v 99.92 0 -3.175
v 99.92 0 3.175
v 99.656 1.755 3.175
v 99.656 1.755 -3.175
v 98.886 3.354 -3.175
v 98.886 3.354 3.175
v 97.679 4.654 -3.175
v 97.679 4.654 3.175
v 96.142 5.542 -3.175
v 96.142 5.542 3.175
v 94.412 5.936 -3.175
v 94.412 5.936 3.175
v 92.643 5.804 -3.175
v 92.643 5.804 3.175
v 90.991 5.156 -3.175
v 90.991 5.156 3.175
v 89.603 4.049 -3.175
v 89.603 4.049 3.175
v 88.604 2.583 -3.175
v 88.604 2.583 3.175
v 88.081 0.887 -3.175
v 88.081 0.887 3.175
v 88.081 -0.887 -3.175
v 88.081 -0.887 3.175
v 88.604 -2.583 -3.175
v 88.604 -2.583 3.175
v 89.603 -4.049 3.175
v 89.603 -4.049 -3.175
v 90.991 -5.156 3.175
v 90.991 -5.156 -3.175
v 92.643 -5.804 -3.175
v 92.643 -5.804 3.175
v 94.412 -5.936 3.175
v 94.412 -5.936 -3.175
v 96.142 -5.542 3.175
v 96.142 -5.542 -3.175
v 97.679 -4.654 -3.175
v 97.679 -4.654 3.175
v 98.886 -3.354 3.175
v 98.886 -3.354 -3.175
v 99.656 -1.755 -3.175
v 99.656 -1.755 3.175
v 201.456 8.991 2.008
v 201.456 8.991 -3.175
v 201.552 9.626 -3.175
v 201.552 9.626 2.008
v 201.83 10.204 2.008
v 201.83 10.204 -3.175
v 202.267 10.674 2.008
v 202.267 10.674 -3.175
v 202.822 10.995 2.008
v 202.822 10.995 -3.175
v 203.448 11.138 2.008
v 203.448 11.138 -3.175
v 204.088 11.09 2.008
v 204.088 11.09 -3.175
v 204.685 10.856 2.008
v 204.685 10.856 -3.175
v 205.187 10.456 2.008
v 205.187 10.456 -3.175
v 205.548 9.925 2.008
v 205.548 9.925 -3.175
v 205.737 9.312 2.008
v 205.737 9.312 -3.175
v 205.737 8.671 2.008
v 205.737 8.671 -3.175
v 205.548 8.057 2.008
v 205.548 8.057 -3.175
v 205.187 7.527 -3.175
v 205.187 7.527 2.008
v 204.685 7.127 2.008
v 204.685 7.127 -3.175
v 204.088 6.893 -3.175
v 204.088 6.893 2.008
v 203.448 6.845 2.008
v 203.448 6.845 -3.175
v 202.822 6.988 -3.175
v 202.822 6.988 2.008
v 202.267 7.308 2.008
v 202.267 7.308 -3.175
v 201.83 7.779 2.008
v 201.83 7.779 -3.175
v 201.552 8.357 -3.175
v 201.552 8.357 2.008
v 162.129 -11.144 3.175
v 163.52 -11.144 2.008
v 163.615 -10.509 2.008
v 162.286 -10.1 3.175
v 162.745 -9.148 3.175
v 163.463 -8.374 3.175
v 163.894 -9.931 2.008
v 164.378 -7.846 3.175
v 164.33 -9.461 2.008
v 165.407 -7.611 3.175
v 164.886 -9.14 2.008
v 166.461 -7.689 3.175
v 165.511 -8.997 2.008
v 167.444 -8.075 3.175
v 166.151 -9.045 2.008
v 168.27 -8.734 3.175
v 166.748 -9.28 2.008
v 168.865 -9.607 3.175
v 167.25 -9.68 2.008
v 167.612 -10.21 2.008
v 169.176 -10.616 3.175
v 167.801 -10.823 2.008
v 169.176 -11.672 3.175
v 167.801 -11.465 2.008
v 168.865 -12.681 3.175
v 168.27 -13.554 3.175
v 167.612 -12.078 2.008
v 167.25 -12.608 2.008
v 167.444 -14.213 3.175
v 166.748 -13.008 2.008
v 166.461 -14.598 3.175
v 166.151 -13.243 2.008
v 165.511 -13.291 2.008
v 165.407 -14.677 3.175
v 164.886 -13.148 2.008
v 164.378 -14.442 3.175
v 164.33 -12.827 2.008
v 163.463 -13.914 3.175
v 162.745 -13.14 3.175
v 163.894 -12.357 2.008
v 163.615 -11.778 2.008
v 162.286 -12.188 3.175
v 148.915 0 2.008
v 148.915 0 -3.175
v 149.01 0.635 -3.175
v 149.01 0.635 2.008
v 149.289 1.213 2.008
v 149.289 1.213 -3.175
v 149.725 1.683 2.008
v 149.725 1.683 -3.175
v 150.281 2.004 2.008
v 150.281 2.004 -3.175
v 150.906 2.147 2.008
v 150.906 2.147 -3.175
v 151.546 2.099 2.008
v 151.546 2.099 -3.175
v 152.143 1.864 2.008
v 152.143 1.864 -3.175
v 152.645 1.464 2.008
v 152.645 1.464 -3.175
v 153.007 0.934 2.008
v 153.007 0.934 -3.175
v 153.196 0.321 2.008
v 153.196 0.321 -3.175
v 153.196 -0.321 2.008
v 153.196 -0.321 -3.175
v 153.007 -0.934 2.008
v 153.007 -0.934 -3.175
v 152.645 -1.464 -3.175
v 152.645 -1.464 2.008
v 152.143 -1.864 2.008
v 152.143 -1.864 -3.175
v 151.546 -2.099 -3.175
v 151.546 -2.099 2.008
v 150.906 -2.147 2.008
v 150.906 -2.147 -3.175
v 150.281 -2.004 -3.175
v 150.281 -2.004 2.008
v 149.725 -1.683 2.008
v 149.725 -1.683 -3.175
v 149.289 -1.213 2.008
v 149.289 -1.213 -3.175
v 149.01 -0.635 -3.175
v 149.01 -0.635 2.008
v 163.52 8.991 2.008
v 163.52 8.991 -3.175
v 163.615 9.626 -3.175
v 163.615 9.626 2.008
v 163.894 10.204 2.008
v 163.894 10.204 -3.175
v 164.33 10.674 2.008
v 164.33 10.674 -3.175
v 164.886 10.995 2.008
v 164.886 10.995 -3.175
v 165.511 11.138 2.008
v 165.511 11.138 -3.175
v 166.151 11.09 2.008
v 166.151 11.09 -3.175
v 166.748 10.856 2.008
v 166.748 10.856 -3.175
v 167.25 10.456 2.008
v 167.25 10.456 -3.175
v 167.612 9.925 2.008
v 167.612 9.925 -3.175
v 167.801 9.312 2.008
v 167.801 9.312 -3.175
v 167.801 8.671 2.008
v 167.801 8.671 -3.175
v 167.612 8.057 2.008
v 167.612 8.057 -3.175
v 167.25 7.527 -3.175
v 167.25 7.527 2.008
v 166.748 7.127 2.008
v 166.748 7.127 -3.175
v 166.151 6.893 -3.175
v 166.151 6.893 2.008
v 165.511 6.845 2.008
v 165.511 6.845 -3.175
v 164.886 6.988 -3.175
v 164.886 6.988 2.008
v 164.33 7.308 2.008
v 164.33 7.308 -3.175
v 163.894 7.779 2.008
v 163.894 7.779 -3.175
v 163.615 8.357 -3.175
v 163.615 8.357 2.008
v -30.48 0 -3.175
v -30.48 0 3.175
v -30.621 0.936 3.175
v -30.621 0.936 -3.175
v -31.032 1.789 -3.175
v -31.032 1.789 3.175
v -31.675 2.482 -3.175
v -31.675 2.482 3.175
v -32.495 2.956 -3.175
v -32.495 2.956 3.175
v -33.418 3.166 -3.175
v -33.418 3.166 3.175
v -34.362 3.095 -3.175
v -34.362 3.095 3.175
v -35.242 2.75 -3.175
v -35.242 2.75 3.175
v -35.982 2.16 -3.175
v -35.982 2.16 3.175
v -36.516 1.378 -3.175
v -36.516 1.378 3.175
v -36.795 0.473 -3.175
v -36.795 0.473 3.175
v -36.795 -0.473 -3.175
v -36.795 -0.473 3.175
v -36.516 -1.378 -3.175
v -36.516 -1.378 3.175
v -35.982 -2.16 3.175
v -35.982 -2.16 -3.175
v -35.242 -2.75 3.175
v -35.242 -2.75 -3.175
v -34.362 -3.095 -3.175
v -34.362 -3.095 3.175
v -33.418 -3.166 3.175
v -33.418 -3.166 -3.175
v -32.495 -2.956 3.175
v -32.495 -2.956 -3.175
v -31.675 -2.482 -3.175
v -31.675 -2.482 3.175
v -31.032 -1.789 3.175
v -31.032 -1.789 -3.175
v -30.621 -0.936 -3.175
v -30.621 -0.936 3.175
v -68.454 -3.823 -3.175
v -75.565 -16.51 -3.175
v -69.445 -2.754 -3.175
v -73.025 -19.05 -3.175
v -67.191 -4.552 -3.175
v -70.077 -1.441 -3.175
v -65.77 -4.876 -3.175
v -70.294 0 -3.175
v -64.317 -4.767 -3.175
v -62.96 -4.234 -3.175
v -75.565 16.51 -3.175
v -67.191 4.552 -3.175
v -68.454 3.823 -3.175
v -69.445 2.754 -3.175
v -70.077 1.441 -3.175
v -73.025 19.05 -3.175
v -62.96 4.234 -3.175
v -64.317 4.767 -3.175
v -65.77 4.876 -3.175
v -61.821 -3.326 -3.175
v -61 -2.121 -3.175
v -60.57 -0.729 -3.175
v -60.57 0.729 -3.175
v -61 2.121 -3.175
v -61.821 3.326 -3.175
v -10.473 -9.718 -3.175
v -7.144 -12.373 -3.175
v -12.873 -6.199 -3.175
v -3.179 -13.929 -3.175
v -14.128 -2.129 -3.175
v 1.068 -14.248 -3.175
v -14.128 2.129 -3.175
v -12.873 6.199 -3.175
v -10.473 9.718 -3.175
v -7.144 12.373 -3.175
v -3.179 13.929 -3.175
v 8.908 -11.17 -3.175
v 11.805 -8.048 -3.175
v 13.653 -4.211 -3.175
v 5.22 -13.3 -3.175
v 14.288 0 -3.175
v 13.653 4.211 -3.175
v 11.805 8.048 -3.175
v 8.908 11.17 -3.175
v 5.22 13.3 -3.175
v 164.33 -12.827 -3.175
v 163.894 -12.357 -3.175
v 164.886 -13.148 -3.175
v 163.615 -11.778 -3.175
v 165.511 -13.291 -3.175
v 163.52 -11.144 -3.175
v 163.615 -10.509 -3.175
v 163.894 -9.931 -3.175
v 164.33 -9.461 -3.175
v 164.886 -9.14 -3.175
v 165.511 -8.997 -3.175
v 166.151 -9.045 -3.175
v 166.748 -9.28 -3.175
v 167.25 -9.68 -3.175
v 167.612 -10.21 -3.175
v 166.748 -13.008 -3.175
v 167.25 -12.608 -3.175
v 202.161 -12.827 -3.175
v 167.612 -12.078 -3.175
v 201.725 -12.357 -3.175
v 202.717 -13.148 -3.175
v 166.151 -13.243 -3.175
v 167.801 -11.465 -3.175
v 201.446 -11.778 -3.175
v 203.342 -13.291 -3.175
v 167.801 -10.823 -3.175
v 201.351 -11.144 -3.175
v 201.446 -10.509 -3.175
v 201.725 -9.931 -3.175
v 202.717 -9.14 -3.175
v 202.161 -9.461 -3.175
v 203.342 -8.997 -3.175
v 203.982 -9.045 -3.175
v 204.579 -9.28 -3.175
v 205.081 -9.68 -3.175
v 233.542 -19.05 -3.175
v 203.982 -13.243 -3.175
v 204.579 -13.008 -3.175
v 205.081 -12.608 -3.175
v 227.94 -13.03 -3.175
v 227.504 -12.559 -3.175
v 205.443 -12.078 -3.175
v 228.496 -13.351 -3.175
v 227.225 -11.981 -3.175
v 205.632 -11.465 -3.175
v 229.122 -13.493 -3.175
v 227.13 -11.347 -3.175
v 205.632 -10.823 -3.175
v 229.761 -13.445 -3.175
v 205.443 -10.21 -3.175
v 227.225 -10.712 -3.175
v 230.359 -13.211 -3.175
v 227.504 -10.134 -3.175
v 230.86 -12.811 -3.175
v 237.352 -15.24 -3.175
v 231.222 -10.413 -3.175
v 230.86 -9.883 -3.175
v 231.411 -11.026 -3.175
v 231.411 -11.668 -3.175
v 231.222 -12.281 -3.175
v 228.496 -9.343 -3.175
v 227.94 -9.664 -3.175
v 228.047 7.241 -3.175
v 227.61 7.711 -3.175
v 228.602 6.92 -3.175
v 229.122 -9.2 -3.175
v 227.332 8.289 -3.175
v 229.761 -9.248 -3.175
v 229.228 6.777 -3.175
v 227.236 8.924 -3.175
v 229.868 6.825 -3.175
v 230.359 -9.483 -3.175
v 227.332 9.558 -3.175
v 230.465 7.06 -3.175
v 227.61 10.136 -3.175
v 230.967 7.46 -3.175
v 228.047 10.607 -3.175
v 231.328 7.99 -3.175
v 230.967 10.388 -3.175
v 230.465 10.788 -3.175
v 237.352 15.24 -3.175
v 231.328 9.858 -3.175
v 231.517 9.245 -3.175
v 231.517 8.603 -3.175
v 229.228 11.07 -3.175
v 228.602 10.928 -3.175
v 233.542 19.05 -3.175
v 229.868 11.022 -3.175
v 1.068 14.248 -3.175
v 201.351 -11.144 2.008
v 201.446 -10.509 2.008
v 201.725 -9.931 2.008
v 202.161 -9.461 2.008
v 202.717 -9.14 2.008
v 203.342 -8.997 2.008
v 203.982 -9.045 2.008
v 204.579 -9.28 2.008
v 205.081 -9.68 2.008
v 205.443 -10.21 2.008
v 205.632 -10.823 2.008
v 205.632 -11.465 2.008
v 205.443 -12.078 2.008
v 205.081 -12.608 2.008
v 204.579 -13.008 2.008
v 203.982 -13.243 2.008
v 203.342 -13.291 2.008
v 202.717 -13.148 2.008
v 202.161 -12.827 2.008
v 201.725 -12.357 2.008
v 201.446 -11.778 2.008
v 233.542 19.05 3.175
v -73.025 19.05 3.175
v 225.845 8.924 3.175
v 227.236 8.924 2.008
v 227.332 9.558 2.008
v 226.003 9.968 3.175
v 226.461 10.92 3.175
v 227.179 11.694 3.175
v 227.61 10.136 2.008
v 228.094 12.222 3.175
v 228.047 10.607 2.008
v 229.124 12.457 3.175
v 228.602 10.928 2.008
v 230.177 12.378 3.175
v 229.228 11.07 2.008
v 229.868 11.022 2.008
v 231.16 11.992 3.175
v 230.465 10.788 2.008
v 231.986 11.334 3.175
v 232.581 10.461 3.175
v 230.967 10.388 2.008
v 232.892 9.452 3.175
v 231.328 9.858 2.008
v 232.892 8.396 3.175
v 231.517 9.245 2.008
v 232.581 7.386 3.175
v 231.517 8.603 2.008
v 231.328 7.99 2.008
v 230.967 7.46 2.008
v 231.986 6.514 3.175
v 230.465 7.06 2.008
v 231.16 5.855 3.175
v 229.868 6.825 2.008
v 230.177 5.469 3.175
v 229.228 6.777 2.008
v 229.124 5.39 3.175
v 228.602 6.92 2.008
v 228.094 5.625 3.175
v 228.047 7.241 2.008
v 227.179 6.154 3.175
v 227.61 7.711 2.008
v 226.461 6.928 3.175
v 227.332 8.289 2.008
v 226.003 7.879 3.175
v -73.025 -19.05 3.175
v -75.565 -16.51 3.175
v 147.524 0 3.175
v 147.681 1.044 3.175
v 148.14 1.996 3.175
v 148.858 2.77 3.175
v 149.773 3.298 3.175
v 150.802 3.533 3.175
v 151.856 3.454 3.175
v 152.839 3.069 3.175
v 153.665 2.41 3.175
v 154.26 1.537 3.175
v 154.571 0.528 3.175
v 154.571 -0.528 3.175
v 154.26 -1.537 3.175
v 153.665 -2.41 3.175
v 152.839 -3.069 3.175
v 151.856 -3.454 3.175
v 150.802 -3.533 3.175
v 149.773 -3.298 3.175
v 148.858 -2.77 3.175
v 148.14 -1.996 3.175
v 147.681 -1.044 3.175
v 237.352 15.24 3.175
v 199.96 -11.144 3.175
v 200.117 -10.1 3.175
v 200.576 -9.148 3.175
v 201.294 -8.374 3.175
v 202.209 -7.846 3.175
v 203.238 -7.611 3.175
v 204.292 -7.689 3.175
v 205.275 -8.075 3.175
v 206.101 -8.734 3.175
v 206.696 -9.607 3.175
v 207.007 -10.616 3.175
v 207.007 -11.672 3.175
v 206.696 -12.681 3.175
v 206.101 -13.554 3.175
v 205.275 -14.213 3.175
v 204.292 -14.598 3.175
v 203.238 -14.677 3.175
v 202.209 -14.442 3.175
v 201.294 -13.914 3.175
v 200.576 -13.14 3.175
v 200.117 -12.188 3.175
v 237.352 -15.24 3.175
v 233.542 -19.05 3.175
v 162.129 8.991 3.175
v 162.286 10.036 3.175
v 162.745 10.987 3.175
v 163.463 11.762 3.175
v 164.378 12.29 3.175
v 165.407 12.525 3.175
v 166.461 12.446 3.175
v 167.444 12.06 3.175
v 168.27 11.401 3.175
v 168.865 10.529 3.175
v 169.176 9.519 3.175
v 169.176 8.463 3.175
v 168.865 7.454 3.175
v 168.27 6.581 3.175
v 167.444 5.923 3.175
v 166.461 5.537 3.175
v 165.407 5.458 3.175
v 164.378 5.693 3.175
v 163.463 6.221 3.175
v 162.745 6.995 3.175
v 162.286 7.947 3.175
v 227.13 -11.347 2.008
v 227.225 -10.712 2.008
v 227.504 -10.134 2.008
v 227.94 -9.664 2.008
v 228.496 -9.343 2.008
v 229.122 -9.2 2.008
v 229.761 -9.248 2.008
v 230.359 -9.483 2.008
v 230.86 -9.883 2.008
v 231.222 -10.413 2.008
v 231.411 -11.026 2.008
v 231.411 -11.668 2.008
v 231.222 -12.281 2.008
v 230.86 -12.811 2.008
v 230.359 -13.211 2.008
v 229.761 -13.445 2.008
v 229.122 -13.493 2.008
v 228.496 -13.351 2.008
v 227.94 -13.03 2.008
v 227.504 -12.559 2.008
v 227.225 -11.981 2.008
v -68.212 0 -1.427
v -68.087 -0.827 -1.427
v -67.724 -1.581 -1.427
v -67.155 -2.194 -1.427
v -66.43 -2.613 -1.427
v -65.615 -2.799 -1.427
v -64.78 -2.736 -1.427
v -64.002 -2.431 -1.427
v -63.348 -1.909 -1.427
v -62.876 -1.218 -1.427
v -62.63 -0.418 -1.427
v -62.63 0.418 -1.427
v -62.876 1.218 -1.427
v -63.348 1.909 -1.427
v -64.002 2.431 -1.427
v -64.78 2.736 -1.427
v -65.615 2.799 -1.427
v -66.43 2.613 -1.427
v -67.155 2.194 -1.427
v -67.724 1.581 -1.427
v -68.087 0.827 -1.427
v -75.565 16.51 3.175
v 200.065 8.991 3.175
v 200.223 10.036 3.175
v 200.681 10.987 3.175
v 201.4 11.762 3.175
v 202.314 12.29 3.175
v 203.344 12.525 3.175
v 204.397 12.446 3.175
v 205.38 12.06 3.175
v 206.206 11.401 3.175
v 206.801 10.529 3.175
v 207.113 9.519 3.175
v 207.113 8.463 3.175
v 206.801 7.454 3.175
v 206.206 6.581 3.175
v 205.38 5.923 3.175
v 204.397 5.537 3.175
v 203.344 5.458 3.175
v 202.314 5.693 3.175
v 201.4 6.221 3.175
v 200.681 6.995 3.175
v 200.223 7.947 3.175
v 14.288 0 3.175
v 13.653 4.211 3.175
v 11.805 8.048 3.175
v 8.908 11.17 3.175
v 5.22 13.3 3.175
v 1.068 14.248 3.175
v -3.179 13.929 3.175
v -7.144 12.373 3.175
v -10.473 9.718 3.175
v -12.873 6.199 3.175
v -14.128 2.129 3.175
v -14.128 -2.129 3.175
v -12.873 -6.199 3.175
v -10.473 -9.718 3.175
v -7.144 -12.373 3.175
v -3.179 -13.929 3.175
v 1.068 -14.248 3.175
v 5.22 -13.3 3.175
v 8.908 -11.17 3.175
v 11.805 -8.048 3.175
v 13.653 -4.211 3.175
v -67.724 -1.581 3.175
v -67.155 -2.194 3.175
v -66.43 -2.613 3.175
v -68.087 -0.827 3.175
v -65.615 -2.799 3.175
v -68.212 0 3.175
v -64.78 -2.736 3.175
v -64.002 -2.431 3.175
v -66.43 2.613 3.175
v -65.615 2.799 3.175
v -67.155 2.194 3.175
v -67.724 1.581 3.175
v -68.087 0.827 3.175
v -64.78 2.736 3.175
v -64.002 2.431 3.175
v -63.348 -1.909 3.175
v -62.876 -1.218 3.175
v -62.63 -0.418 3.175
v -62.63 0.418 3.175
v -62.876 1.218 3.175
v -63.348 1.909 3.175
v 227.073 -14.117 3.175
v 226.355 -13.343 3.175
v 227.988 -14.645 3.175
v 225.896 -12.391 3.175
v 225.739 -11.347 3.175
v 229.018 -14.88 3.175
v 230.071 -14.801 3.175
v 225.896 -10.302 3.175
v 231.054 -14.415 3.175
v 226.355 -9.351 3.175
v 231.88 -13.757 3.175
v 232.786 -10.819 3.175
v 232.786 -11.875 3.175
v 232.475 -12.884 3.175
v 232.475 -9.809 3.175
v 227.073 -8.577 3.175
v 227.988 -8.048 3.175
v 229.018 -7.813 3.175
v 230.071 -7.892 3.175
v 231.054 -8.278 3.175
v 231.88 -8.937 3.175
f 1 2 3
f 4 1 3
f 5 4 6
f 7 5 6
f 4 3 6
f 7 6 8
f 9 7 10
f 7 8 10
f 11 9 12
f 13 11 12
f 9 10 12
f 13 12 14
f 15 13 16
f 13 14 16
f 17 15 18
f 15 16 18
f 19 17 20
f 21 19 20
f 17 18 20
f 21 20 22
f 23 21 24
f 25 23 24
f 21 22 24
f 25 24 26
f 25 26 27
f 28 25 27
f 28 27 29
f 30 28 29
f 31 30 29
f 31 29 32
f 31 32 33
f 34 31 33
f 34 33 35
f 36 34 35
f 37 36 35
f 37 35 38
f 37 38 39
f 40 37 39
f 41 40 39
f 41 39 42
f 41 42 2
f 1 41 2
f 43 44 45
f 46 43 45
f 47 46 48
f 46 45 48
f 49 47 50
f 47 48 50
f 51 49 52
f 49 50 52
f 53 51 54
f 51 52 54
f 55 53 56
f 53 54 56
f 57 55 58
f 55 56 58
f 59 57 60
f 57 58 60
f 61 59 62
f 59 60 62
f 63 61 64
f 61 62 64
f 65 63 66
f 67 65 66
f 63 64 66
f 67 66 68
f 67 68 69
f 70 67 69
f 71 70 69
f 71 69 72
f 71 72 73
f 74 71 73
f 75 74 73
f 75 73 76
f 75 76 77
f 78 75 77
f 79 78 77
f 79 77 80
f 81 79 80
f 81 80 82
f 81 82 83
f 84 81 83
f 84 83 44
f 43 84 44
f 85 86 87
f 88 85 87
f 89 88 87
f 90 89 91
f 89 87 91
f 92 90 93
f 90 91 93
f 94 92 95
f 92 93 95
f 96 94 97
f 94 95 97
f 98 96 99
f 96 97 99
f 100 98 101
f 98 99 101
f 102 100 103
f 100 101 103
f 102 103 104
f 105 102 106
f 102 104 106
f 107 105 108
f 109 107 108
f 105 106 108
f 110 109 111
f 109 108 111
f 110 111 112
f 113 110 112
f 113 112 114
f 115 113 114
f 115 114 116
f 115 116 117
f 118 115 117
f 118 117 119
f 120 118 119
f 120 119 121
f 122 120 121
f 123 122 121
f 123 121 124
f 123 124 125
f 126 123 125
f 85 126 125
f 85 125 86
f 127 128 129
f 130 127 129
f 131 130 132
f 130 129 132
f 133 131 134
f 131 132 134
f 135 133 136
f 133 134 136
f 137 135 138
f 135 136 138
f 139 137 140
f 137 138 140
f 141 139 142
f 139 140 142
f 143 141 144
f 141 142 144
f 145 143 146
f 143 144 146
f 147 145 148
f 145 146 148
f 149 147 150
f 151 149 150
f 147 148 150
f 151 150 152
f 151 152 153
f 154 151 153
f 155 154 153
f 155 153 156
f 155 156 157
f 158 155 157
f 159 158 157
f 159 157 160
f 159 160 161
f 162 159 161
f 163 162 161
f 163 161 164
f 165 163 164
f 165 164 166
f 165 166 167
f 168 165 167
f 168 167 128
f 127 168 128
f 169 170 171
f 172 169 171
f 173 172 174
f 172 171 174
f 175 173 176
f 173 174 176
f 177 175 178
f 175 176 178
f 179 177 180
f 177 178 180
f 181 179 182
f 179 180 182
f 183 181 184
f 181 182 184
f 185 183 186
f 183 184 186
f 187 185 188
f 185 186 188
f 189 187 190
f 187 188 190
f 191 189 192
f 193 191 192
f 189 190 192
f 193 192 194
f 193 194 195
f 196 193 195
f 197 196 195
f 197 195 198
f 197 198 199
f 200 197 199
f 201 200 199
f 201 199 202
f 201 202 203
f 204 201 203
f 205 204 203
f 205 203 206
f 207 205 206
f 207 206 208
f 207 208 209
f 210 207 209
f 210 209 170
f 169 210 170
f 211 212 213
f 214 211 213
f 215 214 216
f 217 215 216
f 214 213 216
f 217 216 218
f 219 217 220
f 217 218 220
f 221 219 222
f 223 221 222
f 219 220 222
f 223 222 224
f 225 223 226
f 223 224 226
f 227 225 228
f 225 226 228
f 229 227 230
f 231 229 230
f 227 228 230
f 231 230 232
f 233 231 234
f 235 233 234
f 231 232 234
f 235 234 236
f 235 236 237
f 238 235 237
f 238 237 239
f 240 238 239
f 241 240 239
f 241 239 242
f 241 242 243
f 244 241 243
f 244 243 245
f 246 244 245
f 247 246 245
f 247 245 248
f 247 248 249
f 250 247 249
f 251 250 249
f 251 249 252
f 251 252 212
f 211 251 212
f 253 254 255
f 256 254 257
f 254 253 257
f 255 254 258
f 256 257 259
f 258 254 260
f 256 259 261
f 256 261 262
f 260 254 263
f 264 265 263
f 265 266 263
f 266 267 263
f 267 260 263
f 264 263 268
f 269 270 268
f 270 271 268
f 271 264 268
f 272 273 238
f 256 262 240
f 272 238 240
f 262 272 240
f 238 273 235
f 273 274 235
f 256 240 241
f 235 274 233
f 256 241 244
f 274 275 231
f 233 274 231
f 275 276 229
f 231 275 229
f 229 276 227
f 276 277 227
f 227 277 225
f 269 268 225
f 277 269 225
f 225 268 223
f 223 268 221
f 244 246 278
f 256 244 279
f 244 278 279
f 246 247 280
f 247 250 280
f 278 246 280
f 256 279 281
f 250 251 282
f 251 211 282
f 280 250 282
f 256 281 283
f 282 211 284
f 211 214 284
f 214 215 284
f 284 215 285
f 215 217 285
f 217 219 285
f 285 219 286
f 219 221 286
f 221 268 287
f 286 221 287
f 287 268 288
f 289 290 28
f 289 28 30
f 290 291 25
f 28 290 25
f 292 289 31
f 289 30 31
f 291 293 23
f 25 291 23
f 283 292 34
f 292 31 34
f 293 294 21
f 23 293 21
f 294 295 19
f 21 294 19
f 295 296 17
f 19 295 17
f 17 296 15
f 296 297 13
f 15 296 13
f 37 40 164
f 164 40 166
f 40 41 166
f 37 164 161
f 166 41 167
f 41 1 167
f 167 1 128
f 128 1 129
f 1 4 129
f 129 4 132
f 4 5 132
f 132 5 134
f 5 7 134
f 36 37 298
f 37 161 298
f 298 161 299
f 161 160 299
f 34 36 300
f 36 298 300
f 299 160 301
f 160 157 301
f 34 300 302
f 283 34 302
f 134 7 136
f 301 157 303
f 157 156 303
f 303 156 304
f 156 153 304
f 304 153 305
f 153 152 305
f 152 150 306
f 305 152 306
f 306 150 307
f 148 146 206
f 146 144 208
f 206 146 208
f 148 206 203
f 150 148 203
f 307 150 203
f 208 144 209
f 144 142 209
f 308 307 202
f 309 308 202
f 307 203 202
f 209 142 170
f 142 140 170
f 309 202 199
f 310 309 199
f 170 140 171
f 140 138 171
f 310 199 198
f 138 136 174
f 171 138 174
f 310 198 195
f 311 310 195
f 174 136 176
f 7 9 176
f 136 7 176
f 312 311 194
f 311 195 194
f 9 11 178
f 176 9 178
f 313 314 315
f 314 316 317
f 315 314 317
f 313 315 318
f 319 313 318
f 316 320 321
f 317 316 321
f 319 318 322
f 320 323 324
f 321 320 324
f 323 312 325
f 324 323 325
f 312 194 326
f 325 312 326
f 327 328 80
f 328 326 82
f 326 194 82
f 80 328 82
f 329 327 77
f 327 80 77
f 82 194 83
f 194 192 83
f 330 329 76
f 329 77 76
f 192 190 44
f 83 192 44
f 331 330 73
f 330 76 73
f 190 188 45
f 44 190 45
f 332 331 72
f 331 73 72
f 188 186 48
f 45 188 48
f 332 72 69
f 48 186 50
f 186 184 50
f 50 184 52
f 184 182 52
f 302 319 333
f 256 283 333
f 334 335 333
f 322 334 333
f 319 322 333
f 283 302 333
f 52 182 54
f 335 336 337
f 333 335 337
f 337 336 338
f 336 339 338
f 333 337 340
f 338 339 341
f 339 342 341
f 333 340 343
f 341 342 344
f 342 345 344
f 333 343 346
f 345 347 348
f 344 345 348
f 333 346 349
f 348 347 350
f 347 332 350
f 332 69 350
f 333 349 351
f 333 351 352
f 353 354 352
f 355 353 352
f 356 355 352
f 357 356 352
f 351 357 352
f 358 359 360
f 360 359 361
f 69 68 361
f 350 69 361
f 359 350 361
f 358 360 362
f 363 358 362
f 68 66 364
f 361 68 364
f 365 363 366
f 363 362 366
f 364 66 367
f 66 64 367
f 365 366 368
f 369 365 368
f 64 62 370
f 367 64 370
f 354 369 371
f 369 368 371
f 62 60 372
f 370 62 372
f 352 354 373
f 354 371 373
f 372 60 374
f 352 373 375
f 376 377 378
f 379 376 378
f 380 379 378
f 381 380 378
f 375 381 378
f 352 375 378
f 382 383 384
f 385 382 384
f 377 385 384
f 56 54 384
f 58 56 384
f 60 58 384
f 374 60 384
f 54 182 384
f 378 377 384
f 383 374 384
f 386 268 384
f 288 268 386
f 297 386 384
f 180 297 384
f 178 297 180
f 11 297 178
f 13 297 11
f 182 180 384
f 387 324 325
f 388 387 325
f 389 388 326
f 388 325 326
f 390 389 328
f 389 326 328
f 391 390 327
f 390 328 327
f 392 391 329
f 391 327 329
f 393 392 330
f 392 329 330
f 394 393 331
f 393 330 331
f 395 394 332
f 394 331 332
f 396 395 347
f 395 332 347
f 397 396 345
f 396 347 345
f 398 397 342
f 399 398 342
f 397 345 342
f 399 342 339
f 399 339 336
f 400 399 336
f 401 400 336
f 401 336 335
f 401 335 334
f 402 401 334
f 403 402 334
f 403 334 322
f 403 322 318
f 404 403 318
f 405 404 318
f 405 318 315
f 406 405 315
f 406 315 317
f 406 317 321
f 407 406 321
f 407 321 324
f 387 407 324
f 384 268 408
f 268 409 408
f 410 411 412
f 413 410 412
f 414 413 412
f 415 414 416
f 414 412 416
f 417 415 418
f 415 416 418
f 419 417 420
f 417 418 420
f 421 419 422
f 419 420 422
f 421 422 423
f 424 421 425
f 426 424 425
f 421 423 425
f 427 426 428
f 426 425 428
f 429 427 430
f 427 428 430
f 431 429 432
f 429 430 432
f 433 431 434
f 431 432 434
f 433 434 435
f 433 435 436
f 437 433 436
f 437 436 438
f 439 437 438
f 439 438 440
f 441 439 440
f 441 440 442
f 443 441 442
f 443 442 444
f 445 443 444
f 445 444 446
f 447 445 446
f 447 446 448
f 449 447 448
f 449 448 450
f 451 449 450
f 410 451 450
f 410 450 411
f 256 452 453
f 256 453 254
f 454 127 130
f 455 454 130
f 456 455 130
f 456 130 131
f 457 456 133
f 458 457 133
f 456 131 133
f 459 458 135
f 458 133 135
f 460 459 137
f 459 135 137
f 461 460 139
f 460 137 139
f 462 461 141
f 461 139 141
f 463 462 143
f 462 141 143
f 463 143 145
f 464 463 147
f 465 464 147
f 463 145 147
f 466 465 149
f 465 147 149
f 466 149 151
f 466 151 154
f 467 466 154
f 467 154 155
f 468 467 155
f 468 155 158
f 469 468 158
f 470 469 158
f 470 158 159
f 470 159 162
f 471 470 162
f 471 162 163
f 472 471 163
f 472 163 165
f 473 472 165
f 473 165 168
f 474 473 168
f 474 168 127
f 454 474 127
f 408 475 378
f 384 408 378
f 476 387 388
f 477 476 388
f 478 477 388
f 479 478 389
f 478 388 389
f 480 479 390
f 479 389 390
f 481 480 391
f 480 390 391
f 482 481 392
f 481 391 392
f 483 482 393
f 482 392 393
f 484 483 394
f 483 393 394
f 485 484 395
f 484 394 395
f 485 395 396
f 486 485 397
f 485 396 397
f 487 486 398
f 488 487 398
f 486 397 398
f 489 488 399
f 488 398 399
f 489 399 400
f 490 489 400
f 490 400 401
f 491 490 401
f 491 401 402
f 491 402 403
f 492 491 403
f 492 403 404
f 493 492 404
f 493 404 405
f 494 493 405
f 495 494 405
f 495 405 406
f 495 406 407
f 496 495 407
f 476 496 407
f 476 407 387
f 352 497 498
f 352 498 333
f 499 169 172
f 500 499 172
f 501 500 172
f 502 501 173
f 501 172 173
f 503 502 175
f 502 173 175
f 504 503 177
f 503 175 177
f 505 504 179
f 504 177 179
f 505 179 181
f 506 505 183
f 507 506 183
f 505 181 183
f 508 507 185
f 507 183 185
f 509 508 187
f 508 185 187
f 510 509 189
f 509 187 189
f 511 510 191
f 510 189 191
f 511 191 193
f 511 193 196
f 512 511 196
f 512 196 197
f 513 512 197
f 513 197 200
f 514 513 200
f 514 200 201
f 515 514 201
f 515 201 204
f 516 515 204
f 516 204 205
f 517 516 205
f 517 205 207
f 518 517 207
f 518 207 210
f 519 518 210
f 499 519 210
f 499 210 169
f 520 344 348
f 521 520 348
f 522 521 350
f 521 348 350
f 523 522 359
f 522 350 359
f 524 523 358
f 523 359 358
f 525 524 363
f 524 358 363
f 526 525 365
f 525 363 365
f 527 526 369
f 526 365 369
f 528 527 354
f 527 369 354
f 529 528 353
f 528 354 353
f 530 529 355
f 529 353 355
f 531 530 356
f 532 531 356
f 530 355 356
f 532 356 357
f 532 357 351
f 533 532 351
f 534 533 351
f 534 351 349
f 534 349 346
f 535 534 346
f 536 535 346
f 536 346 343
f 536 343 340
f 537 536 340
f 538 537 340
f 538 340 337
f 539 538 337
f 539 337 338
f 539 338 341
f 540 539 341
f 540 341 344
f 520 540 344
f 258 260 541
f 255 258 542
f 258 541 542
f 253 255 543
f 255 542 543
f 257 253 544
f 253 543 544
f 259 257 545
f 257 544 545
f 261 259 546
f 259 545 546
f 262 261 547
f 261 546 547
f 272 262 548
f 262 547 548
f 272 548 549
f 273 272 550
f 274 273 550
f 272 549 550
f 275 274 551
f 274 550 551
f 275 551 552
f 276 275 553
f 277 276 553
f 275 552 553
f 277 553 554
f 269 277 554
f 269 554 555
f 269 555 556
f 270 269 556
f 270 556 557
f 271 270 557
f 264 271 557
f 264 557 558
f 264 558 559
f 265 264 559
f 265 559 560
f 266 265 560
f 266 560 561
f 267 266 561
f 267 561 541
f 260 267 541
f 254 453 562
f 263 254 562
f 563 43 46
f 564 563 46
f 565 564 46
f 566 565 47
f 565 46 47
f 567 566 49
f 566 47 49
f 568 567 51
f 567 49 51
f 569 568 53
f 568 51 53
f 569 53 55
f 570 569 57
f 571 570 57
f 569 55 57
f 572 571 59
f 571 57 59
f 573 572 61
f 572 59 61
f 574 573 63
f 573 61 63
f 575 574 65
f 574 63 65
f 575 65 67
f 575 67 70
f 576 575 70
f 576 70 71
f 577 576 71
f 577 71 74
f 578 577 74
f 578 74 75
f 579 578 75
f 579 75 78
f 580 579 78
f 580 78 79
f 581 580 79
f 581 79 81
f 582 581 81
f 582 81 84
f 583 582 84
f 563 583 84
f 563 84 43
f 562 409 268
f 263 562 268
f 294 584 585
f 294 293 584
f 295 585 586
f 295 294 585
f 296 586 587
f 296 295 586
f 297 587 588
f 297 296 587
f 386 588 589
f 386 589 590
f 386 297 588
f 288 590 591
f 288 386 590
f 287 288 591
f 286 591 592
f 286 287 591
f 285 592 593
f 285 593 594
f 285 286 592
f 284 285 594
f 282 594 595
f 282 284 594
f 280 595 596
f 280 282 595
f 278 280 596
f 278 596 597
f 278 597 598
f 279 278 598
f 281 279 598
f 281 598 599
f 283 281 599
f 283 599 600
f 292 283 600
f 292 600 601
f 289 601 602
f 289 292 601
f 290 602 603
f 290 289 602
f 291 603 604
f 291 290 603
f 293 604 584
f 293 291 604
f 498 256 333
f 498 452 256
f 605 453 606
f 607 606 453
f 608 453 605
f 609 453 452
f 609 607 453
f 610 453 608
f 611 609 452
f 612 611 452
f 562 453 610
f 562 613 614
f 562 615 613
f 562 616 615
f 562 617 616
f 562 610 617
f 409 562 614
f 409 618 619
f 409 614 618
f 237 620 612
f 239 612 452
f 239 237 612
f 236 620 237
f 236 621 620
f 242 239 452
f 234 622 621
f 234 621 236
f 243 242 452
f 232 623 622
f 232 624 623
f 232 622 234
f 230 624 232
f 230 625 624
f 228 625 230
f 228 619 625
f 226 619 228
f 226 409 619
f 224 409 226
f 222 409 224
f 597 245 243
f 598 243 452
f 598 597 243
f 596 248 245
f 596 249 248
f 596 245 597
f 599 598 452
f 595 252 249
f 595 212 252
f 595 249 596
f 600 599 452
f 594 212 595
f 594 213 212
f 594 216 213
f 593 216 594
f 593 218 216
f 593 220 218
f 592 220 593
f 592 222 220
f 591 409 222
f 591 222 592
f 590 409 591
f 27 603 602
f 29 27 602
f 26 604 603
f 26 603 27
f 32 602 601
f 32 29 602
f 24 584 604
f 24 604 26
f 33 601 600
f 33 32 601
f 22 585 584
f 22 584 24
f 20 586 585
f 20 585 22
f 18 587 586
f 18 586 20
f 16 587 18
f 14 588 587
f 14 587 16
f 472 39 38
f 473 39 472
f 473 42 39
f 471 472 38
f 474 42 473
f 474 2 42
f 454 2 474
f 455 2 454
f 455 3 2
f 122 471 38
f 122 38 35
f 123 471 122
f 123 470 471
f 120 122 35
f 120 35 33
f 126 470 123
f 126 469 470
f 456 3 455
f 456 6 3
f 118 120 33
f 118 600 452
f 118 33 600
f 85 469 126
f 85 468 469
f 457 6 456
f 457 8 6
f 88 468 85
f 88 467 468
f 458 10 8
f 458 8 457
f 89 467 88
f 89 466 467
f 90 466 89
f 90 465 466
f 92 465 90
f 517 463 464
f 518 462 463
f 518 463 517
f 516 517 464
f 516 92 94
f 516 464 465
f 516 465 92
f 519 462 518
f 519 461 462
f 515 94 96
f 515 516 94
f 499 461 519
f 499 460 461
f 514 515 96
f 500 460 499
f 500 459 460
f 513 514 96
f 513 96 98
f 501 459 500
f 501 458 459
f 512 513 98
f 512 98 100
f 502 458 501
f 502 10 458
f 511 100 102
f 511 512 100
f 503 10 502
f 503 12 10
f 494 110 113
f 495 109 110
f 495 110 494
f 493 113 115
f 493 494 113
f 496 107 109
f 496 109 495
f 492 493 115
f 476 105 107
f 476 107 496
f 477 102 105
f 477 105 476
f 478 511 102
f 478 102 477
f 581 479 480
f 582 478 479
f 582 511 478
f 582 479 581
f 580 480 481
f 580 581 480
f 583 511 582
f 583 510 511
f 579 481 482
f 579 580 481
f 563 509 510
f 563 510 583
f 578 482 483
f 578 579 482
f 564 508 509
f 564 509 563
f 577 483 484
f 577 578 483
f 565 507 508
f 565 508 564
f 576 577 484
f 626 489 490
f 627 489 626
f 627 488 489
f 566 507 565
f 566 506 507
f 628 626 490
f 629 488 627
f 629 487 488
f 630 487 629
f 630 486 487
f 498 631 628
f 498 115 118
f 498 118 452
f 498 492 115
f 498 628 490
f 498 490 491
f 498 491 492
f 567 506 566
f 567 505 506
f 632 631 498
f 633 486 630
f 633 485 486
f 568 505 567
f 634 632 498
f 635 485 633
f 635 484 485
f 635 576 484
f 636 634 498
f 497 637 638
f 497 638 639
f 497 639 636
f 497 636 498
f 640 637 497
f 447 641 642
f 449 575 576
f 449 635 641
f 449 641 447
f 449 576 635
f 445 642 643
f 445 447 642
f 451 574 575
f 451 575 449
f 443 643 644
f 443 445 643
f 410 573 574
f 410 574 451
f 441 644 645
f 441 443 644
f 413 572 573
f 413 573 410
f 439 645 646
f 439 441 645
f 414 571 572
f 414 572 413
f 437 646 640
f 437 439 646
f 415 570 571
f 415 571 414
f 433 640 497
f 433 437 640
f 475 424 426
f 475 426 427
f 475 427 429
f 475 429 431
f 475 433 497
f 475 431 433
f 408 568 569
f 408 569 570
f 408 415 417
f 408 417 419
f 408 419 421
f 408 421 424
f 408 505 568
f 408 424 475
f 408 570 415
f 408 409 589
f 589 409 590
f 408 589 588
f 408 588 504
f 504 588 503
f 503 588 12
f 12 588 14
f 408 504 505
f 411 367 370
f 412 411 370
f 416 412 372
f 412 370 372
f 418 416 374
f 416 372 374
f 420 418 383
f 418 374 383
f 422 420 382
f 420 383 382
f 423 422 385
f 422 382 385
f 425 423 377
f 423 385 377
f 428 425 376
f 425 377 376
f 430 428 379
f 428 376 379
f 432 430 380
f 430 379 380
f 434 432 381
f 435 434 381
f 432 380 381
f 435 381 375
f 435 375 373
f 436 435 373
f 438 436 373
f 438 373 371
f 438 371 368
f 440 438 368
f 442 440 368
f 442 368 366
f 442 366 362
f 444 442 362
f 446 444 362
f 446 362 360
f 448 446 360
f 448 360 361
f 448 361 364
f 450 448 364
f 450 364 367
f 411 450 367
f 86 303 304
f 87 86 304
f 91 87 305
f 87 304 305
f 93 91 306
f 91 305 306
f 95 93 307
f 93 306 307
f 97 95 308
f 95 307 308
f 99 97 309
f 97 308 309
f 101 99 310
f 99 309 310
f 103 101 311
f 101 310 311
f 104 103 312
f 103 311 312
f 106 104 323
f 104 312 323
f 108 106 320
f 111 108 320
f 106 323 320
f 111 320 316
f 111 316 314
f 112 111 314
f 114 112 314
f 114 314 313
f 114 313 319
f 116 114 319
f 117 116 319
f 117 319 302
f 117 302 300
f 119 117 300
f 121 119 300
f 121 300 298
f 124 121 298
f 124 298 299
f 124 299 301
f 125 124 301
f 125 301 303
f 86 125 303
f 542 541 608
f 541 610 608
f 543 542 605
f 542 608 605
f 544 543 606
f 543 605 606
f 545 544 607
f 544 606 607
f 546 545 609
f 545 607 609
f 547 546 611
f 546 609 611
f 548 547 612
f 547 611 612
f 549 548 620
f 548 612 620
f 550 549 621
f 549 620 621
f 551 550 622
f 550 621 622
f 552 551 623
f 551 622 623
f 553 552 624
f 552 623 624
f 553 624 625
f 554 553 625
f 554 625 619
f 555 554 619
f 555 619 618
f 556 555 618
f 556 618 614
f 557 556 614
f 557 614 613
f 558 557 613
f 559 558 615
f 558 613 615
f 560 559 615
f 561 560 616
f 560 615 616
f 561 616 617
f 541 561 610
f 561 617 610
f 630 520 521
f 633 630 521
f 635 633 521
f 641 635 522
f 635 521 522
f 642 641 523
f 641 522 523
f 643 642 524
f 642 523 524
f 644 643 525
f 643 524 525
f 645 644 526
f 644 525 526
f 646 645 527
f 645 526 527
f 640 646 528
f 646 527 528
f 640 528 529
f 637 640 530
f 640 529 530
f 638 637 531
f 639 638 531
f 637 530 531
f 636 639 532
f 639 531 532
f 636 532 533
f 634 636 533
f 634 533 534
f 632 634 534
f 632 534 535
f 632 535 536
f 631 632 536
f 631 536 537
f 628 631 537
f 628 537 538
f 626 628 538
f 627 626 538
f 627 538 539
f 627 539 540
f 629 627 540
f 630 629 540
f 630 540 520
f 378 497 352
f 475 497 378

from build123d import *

# Parameters (mm, degrees)
SKETCH1_R                                          = 14.2875
BOSS_EXTRUDE1_DEPTH                                = 3.175
F_6_CLEARANCE_HOLE3_D                              = 4.3053
CUT_EXTRUDE1_DEPTH                                 = 255.792513626
CHAMFER1_SIZE                                      = 3.81
CSK_FOR_6_FLAT_HEAD_MACHINE_SCREW_100_D            = 4.3053
CSK_FOR_6_FLAT_HEAD_MACHINE_SCREW_100_CSINK_D      = 7.0866
CSK_FOR_6_FLAT_HEAD_MACHINE_SCREW_100_CSINK_ANGLE  = 100
SKETCH14_W                                         = 50.8
SKETCH14_H                                         = 38.1
BOSS_EXTRUDE2_DEPTH                                = 6.35
CHAMFER2_SIZE                                      = 2.54
CSK_FOR_10_FLAT_HEAD_MACHINE_SCREW_100_D           = 5.6134
CSK_FOR_10_FLAT_HEAD_MACHINE_SCREW_100_CSINK_D     = 9.779
CSK_FOR_10_FLAT_HEAD_MACHINE_SCREW_100_CSINK_ANGLE = 100
F_1_4_0_25_DIAMETER_HOLE1_D                        = 6.35
F_15_32_0_46875_DIAMETER_HOLE1_D                   = 11.90625


with BuildPart() as part:
    # Sketch1 → Boss-Extrude1 (new, symmetric)
    with BuildSketch(Plane.XY):
        Polygon((0, 19.05), (-28.575, 19.05), (-28.575, -19.05), (0, -19.05), (247.281942035, -19.05), (254, 19.05), align=None)
        Circle(SKETCH1_R, mode=Mode.SUBTRACT)
    extrude(amount=BOSS_EXTRUDE1_DEPTH, both=True)

    # #6 Clearance Hole3 (through all)
    with Locations(Plane.XY.offset(3.175)):
        with Locations((229.388701471, 8.923791784), (229.282371239, -11.346798968), (203.503161764, -11.143926969), (203.608782335, 8.991375351), (165.672159691, 8.991375351), (165.672159691, -11.143926969), (151.067159691, 0)):
            Hole(F_6_CLEARANCE_HOLE3_D / 2)

    # Sketch9 → Cut-Extrude1 (cut, through all)
    with BuildSketch(Plane.XY.offset(3.175)):
        Polygon((254, 19.05), (247.281942035, -19.05), (237.352085197, -19.05), (237.352085197, 19.05), align=None)
    extrude(amount=-CUT_EXTRUDE1_DEPTH, mode=Mode.SUBTRACT)

    # Chamfer1
    chamfer1_edges = [part.edges().sort_by_distance(p)[0] for p in [
        (-28.575, -19.05, 0),
        (-28.575, 19.05, 0),
        (237.352085197, 19.05, 0),
        (237.352085197, -19.05, 0),
    ]]
    chamfer(chamfer1_edges, length=CHAMFER1_SIZE)

    # CSK for #6 Flat Head Machine Screw (100)2 (through all)
    with Locations(Plane.XY.offset(3.175)):
        with Locations((203.608782335, 8.991375351), (203.503161764, -11.143926969), (229.282371239, -11.346798968), (229.388701471, 8.923791784), (165.672159691, 8.991375351), (165.672159691, -11.143926969), (151.067159691, 0)):
            CounterSinkHole(CSK_FOR_6_FLAT_HEAD_MACHINE_SCREW_100_D / 2, CSK_FOR_6_FLAT_HEAD_MACHINE_SCREW_100_CSINK_D / 2, counter_sink_angle=CSK_FOR_6_FLAT_HEAD_MACHINE_SCREW_100_CSINK_ANGLE)

    # Sketch14 → Boss-Extrude2 (add, through all)
    with BuildSketch(Plane.XY.offset(3.175)):
        with Locations((-50.165, 0)):
            Rectangle(SKETCH14_W, SKETCH14_H)
    extrude(amount=-BOSS_EXTRUDE2_DEPTH)

    # Chamfer2
    chamfer2_edges = [part.edges().sort_by_distance(p)[0] for p in [
        (-75.565, -19.05, 0),
        (-75.565, 19.05, 0),
    ]]
    chamfer(chamfer2_edges, length=CHAMFER2_SIZE)

    # CSK for #10 Flat Head Machine Screw (100)1 (through all)
    with Locations(Plane(origin=(0, 0, -3.175), x_dir=(1, 0, 0), z_dir=(0, 0, -1))):
        with Locations((-65.405, 0)):
            CounterSinkHole(CSK_FOR_10_FLAT_HEAD_MACHINE_SCREW_100_D / 2, CSK_FOR_10_FLAT_HEAD_MACHINE_SCREW_100_CSINK_D / 2, counter_sink_angle=CSK_FOR_10_FLAT_HEAD_MACHINE_SCREW_100_CSINK_ANGLE)

    # 1/4 (0.25) Diameter Hole1 (through all)
    with Locations(Plane(origin=(0, 0, -3.175), x_dir=(-1, 0, 0), z_dir=(0, 0, -1))):
        with Locations((33.655, 0)):
            Hole(F_1_4_0_25_DIAMETER_HOLE1_D / 2)

    # 15/32 (0.46875) Diameter Hole1 (through all)
    with Locations(Plane(origin=(0, 0, -3.175), x_dir=(-1, 0, 0), z_dir=(0, 0, -1))):
        with Locations((-93.967218212, 0)):
            Hole(F_15_32_0_46875_DIAMETER_HOLE1_D / 2)


solid = part.part
